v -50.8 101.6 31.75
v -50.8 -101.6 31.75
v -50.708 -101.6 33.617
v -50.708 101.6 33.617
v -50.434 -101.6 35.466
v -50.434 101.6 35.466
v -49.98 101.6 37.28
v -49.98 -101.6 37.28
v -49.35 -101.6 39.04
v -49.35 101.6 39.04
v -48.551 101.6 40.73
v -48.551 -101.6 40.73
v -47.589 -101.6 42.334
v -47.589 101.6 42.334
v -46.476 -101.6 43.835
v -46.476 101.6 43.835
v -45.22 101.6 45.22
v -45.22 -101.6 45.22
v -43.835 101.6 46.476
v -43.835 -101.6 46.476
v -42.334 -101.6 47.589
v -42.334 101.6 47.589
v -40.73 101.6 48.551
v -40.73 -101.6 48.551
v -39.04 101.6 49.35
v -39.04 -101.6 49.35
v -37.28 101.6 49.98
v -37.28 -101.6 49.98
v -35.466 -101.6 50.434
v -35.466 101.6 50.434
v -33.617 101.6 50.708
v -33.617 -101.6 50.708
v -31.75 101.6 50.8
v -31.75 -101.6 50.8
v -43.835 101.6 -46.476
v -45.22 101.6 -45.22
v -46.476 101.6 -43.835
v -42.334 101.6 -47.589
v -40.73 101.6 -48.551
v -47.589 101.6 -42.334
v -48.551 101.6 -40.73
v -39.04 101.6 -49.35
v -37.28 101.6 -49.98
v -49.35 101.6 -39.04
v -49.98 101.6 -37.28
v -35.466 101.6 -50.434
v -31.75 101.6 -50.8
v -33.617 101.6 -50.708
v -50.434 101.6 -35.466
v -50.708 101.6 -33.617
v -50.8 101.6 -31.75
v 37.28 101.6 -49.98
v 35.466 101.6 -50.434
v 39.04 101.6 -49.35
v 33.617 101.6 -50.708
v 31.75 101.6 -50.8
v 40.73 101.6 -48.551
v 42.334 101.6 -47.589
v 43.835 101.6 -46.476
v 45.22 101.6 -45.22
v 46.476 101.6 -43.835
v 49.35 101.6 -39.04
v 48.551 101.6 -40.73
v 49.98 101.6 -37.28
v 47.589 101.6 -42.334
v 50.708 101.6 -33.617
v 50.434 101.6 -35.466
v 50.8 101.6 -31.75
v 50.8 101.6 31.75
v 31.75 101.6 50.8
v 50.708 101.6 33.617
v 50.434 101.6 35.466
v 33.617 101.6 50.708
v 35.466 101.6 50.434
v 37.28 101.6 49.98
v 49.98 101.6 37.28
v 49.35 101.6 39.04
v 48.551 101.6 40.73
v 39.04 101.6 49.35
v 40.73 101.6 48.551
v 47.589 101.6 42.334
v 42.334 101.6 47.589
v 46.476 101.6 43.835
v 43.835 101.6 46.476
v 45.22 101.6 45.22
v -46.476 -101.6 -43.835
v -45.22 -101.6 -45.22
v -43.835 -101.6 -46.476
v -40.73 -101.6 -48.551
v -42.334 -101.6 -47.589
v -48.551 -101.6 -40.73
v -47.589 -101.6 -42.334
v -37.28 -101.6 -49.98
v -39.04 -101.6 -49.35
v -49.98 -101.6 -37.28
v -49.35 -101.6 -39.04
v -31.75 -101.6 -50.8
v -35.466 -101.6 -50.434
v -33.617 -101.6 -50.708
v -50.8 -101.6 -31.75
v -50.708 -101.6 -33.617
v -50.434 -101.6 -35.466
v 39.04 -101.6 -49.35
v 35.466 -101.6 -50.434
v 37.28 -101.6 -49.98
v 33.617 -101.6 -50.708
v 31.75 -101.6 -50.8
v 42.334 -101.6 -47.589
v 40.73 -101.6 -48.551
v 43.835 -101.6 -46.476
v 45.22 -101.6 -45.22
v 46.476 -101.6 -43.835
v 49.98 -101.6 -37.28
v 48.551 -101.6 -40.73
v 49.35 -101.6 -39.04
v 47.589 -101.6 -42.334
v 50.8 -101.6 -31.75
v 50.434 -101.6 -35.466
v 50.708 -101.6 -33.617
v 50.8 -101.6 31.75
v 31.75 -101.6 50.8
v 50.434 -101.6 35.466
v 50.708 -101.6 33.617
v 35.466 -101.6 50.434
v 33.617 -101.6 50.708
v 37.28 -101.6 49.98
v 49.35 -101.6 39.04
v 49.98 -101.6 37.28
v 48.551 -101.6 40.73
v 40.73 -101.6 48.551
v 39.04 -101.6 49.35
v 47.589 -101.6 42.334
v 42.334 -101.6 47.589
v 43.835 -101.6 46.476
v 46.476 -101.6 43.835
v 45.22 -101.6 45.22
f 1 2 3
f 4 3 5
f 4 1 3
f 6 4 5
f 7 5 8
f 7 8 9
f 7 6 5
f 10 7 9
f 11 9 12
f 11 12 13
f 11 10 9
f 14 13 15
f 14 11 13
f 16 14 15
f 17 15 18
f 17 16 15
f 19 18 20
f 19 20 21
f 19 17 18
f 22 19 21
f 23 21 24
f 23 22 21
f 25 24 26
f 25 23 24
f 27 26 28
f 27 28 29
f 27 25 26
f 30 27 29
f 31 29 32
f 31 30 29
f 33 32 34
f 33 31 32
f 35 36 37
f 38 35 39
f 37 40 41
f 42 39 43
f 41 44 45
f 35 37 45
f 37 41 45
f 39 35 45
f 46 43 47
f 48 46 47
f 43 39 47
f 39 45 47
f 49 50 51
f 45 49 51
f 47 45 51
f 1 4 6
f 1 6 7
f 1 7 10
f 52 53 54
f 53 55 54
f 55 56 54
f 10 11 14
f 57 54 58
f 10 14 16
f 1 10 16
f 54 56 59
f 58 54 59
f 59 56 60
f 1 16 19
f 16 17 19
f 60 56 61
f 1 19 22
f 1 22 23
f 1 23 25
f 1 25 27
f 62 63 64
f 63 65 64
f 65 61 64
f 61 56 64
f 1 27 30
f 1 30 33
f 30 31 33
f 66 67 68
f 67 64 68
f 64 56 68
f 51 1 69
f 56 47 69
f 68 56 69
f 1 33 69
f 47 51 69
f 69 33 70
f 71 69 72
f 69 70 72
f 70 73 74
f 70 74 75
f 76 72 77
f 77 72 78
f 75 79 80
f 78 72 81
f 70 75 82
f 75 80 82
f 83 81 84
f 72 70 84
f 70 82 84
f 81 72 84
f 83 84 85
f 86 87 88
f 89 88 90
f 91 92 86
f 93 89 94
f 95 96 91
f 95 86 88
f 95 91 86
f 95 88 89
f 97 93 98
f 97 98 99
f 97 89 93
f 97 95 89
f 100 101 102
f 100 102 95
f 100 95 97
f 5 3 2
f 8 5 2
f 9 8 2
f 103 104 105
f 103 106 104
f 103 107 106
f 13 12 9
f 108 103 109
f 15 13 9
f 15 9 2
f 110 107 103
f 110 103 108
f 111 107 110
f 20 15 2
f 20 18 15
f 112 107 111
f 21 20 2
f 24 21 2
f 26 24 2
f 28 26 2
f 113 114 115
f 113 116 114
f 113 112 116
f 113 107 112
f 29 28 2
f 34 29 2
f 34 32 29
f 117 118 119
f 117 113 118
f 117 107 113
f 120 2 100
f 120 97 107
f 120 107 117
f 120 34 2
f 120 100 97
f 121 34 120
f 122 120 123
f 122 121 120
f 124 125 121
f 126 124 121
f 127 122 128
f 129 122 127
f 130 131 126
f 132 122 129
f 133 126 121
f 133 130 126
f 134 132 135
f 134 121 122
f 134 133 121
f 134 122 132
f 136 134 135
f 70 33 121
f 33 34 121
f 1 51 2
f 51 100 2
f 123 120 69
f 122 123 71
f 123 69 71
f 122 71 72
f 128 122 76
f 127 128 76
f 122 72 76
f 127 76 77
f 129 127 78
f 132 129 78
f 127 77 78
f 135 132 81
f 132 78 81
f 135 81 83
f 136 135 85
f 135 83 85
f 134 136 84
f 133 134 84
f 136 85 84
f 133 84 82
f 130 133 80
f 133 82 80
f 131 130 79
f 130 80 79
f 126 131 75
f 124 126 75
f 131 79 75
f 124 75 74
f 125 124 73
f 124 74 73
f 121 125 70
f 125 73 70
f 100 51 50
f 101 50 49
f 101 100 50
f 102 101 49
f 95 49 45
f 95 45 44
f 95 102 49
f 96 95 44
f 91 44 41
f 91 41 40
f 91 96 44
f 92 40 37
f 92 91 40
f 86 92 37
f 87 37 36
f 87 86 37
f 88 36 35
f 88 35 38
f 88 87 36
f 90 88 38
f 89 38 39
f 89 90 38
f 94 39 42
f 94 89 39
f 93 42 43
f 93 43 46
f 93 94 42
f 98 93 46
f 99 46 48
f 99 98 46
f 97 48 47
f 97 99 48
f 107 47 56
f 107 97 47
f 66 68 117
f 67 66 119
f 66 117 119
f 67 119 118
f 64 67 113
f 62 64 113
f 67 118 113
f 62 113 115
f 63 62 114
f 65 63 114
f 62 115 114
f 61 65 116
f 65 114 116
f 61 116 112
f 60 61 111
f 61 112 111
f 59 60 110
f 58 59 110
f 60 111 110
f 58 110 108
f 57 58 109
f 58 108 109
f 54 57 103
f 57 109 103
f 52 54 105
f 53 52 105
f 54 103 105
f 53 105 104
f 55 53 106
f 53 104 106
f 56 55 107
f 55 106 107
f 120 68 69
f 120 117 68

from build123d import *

# Parameters (mm, degrees)
F0_W          = 101.6
F0_H          = 101.6
F1_DEPTH      = 101.6
F1_DEPTH_BACK = 101.6
F2_R          = 19.05
F3_R          = 2.738729
F4_DEPTH      = 19.304


with BuildPart() as f1:
    # F0 (on Front) → F1 (new body, two sides)
    with BuildSketch(Plane.XZ) as f1_sk:
        Rectangle(F0_W, F0_H)
    extrude(amount=F1_DEPTH)
    extrude(f1_sk.sketch, amount=-F1_DEPTH_BACK)

    # F2
    f2_edges = [f1.edges().sort_by_distance(p)[0] for p in [
        (-50.8, 0, 50.8),
        (50.8, 0, 50.8),
        (50.8, 0, -50.8),
        (-50.8, 0, -50.8),
    ]]
    fillet(f2_edges, radius=F2_R)

    # F3 (on face) → F4 (join)
    with BuildSketch(Plane(origin=(0, 0, -50.8), x_dir=(1, 0, 0), z_dir=(0, 0, -1))):
        with Locations((-22.506165, 95.329402)):
            Circle(F3_R)
    extrude(amount=-F4_DEPTH)


solid = f1.part
